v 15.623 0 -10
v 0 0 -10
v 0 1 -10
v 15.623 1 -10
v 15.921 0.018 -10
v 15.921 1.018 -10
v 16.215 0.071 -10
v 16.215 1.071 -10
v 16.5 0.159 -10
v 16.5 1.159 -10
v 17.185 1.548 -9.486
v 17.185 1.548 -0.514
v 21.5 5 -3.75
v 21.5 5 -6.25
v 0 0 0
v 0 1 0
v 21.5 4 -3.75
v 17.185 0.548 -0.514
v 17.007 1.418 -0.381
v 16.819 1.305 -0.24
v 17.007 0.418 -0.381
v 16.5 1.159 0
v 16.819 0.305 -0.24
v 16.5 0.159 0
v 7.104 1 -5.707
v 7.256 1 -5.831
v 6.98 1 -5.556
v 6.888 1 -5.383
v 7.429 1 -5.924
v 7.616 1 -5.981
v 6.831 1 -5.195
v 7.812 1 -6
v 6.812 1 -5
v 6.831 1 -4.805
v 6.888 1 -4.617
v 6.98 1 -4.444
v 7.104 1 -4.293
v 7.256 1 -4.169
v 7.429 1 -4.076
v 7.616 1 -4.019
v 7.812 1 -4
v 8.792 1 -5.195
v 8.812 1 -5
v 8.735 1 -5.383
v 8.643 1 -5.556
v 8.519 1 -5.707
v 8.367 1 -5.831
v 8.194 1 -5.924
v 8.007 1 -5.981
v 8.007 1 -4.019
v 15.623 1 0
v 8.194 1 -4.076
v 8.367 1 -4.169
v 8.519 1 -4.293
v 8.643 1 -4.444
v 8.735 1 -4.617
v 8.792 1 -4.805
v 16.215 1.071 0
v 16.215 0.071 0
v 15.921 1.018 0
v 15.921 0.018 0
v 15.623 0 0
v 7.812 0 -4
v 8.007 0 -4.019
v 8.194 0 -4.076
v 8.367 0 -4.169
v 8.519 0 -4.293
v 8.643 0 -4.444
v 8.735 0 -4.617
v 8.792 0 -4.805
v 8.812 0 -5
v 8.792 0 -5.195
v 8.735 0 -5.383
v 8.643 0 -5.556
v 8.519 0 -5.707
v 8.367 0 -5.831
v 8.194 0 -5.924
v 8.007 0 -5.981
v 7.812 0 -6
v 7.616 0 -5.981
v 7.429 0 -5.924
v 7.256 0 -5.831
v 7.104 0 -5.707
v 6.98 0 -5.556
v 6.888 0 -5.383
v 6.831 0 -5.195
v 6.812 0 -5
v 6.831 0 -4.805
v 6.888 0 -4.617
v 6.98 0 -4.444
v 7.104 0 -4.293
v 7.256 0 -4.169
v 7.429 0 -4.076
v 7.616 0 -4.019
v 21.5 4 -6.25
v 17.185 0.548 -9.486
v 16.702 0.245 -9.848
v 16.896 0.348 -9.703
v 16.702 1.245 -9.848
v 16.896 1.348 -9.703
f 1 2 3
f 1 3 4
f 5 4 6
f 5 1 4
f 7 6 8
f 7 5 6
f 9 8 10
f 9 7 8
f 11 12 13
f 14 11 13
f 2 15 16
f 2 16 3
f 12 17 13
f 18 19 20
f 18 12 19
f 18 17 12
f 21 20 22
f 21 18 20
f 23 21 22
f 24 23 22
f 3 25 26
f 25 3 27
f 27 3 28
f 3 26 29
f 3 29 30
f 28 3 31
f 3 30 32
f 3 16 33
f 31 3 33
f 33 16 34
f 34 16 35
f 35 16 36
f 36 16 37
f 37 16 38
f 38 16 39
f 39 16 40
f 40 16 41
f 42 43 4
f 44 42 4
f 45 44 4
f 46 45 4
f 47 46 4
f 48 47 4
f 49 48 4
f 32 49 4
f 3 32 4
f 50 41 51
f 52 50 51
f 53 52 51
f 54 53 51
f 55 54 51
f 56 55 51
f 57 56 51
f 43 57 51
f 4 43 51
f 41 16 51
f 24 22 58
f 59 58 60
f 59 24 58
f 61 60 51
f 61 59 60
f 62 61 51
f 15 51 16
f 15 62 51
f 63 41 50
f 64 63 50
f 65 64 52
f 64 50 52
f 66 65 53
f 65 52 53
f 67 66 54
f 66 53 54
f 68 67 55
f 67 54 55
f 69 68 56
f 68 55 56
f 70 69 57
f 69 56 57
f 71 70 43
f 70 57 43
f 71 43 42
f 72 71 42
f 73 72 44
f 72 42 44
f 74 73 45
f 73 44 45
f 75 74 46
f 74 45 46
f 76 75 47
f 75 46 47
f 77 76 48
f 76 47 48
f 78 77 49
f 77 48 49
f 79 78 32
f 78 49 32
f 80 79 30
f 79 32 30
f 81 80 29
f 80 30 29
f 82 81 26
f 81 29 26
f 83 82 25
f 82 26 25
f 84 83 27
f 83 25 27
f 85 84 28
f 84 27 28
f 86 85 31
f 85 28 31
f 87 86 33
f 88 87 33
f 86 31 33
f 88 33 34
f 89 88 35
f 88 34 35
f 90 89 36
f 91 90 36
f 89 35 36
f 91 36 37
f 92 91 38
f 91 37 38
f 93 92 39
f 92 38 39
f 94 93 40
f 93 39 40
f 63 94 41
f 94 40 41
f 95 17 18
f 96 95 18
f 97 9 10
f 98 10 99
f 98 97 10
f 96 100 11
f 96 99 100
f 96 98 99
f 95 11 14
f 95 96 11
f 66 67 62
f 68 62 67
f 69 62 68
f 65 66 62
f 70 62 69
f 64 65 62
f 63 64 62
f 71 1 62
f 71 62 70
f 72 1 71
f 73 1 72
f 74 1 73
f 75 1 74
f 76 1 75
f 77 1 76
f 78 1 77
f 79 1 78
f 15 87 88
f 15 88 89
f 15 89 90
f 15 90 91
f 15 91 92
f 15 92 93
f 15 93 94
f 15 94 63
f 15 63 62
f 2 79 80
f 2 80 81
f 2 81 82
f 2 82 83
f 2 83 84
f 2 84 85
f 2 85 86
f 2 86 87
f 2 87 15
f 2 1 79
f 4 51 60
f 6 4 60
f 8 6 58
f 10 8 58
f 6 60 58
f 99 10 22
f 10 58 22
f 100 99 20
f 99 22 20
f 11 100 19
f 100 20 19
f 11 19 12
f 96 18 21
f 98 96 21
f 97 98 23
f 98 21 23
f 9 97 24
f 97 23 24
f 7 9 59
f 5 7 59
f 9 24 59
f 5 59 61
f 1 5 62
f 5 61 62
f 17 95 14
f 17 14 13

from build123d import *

# Parameters (mm, degrees)
BOSS_EXTRUDE1_DEPTH = 5
SKETCH8_W           = 28.13850749
SKETCH8_H           = 12.868219889
CUT_EXTRUDE5_DEPTH  = 10
SKETCH9_R           = 1
CUT_EXTRUDE6_DEPTH  = 1


with BuildPart() as part:
    # Sketch2 → Boss-Extrude1 (new body)
    with BuildSketch(Plane(origin=(0, 0, 0), x_dir=(1, 0, 0), z_dir=(0, 1, 0))):
        Polygon((16.5, 10), (21.5, 6.25), (21.5, 3.75), (16.5, 0), (0, 0), (0, 10), align=None)
    extrude(amount=BOSS_EXTRUDE1_DEPTH)

    # Sketch8 → Cut-Extrude5 (cut)
    with BuildSketch(Plane.XY):
        with Locations((10.578423735, 2.655771349)):
            Rectangle(SKETCH8_W, SKETCH8_H)
        with BuildLine():
            Line((0, 0), (0, 1))
            Line((0, 1), (15.623047352, 1))
            ThreePointArc((15.623047352, 1), (16.450564705, 1.140929202), (17.18478497, 1.547827976))
            Line((17.18478497, 1.547827976), (21.5, 5))
            Line((21.5, 5), (21.5, 4))
            Line((21.5, 4), (17.18478497, 0.547827976))
            ThreePointArc((17.18478497, 0.547827976), (16.450564705, 0.140929202), (15.623047352, 0))
            Line((15.623047352, 0), (0, 0))
        make_face(mode=Mode.SUBTRACT)
    extrude(amount=-CUT_EXTRUDE5_DEPTH, mode=Mode.SUBTRACT)

    # Sketch9 → Cut-Extrude6 (cut)
    with BuildSketch(Plane(origin=(0, 1, 0), x_dir=(1, 0, 0), z_dir=(0, 1, 0))):
        with Locations(Location((7.811523676, 5, 0), (0, 0, 270))):
            Circle(SKETCH9_R)
    extrude(amount=-CUT_EXTRUDE6_DEPTH, mode=Mode.SUBTRACT)


solid = part.part
